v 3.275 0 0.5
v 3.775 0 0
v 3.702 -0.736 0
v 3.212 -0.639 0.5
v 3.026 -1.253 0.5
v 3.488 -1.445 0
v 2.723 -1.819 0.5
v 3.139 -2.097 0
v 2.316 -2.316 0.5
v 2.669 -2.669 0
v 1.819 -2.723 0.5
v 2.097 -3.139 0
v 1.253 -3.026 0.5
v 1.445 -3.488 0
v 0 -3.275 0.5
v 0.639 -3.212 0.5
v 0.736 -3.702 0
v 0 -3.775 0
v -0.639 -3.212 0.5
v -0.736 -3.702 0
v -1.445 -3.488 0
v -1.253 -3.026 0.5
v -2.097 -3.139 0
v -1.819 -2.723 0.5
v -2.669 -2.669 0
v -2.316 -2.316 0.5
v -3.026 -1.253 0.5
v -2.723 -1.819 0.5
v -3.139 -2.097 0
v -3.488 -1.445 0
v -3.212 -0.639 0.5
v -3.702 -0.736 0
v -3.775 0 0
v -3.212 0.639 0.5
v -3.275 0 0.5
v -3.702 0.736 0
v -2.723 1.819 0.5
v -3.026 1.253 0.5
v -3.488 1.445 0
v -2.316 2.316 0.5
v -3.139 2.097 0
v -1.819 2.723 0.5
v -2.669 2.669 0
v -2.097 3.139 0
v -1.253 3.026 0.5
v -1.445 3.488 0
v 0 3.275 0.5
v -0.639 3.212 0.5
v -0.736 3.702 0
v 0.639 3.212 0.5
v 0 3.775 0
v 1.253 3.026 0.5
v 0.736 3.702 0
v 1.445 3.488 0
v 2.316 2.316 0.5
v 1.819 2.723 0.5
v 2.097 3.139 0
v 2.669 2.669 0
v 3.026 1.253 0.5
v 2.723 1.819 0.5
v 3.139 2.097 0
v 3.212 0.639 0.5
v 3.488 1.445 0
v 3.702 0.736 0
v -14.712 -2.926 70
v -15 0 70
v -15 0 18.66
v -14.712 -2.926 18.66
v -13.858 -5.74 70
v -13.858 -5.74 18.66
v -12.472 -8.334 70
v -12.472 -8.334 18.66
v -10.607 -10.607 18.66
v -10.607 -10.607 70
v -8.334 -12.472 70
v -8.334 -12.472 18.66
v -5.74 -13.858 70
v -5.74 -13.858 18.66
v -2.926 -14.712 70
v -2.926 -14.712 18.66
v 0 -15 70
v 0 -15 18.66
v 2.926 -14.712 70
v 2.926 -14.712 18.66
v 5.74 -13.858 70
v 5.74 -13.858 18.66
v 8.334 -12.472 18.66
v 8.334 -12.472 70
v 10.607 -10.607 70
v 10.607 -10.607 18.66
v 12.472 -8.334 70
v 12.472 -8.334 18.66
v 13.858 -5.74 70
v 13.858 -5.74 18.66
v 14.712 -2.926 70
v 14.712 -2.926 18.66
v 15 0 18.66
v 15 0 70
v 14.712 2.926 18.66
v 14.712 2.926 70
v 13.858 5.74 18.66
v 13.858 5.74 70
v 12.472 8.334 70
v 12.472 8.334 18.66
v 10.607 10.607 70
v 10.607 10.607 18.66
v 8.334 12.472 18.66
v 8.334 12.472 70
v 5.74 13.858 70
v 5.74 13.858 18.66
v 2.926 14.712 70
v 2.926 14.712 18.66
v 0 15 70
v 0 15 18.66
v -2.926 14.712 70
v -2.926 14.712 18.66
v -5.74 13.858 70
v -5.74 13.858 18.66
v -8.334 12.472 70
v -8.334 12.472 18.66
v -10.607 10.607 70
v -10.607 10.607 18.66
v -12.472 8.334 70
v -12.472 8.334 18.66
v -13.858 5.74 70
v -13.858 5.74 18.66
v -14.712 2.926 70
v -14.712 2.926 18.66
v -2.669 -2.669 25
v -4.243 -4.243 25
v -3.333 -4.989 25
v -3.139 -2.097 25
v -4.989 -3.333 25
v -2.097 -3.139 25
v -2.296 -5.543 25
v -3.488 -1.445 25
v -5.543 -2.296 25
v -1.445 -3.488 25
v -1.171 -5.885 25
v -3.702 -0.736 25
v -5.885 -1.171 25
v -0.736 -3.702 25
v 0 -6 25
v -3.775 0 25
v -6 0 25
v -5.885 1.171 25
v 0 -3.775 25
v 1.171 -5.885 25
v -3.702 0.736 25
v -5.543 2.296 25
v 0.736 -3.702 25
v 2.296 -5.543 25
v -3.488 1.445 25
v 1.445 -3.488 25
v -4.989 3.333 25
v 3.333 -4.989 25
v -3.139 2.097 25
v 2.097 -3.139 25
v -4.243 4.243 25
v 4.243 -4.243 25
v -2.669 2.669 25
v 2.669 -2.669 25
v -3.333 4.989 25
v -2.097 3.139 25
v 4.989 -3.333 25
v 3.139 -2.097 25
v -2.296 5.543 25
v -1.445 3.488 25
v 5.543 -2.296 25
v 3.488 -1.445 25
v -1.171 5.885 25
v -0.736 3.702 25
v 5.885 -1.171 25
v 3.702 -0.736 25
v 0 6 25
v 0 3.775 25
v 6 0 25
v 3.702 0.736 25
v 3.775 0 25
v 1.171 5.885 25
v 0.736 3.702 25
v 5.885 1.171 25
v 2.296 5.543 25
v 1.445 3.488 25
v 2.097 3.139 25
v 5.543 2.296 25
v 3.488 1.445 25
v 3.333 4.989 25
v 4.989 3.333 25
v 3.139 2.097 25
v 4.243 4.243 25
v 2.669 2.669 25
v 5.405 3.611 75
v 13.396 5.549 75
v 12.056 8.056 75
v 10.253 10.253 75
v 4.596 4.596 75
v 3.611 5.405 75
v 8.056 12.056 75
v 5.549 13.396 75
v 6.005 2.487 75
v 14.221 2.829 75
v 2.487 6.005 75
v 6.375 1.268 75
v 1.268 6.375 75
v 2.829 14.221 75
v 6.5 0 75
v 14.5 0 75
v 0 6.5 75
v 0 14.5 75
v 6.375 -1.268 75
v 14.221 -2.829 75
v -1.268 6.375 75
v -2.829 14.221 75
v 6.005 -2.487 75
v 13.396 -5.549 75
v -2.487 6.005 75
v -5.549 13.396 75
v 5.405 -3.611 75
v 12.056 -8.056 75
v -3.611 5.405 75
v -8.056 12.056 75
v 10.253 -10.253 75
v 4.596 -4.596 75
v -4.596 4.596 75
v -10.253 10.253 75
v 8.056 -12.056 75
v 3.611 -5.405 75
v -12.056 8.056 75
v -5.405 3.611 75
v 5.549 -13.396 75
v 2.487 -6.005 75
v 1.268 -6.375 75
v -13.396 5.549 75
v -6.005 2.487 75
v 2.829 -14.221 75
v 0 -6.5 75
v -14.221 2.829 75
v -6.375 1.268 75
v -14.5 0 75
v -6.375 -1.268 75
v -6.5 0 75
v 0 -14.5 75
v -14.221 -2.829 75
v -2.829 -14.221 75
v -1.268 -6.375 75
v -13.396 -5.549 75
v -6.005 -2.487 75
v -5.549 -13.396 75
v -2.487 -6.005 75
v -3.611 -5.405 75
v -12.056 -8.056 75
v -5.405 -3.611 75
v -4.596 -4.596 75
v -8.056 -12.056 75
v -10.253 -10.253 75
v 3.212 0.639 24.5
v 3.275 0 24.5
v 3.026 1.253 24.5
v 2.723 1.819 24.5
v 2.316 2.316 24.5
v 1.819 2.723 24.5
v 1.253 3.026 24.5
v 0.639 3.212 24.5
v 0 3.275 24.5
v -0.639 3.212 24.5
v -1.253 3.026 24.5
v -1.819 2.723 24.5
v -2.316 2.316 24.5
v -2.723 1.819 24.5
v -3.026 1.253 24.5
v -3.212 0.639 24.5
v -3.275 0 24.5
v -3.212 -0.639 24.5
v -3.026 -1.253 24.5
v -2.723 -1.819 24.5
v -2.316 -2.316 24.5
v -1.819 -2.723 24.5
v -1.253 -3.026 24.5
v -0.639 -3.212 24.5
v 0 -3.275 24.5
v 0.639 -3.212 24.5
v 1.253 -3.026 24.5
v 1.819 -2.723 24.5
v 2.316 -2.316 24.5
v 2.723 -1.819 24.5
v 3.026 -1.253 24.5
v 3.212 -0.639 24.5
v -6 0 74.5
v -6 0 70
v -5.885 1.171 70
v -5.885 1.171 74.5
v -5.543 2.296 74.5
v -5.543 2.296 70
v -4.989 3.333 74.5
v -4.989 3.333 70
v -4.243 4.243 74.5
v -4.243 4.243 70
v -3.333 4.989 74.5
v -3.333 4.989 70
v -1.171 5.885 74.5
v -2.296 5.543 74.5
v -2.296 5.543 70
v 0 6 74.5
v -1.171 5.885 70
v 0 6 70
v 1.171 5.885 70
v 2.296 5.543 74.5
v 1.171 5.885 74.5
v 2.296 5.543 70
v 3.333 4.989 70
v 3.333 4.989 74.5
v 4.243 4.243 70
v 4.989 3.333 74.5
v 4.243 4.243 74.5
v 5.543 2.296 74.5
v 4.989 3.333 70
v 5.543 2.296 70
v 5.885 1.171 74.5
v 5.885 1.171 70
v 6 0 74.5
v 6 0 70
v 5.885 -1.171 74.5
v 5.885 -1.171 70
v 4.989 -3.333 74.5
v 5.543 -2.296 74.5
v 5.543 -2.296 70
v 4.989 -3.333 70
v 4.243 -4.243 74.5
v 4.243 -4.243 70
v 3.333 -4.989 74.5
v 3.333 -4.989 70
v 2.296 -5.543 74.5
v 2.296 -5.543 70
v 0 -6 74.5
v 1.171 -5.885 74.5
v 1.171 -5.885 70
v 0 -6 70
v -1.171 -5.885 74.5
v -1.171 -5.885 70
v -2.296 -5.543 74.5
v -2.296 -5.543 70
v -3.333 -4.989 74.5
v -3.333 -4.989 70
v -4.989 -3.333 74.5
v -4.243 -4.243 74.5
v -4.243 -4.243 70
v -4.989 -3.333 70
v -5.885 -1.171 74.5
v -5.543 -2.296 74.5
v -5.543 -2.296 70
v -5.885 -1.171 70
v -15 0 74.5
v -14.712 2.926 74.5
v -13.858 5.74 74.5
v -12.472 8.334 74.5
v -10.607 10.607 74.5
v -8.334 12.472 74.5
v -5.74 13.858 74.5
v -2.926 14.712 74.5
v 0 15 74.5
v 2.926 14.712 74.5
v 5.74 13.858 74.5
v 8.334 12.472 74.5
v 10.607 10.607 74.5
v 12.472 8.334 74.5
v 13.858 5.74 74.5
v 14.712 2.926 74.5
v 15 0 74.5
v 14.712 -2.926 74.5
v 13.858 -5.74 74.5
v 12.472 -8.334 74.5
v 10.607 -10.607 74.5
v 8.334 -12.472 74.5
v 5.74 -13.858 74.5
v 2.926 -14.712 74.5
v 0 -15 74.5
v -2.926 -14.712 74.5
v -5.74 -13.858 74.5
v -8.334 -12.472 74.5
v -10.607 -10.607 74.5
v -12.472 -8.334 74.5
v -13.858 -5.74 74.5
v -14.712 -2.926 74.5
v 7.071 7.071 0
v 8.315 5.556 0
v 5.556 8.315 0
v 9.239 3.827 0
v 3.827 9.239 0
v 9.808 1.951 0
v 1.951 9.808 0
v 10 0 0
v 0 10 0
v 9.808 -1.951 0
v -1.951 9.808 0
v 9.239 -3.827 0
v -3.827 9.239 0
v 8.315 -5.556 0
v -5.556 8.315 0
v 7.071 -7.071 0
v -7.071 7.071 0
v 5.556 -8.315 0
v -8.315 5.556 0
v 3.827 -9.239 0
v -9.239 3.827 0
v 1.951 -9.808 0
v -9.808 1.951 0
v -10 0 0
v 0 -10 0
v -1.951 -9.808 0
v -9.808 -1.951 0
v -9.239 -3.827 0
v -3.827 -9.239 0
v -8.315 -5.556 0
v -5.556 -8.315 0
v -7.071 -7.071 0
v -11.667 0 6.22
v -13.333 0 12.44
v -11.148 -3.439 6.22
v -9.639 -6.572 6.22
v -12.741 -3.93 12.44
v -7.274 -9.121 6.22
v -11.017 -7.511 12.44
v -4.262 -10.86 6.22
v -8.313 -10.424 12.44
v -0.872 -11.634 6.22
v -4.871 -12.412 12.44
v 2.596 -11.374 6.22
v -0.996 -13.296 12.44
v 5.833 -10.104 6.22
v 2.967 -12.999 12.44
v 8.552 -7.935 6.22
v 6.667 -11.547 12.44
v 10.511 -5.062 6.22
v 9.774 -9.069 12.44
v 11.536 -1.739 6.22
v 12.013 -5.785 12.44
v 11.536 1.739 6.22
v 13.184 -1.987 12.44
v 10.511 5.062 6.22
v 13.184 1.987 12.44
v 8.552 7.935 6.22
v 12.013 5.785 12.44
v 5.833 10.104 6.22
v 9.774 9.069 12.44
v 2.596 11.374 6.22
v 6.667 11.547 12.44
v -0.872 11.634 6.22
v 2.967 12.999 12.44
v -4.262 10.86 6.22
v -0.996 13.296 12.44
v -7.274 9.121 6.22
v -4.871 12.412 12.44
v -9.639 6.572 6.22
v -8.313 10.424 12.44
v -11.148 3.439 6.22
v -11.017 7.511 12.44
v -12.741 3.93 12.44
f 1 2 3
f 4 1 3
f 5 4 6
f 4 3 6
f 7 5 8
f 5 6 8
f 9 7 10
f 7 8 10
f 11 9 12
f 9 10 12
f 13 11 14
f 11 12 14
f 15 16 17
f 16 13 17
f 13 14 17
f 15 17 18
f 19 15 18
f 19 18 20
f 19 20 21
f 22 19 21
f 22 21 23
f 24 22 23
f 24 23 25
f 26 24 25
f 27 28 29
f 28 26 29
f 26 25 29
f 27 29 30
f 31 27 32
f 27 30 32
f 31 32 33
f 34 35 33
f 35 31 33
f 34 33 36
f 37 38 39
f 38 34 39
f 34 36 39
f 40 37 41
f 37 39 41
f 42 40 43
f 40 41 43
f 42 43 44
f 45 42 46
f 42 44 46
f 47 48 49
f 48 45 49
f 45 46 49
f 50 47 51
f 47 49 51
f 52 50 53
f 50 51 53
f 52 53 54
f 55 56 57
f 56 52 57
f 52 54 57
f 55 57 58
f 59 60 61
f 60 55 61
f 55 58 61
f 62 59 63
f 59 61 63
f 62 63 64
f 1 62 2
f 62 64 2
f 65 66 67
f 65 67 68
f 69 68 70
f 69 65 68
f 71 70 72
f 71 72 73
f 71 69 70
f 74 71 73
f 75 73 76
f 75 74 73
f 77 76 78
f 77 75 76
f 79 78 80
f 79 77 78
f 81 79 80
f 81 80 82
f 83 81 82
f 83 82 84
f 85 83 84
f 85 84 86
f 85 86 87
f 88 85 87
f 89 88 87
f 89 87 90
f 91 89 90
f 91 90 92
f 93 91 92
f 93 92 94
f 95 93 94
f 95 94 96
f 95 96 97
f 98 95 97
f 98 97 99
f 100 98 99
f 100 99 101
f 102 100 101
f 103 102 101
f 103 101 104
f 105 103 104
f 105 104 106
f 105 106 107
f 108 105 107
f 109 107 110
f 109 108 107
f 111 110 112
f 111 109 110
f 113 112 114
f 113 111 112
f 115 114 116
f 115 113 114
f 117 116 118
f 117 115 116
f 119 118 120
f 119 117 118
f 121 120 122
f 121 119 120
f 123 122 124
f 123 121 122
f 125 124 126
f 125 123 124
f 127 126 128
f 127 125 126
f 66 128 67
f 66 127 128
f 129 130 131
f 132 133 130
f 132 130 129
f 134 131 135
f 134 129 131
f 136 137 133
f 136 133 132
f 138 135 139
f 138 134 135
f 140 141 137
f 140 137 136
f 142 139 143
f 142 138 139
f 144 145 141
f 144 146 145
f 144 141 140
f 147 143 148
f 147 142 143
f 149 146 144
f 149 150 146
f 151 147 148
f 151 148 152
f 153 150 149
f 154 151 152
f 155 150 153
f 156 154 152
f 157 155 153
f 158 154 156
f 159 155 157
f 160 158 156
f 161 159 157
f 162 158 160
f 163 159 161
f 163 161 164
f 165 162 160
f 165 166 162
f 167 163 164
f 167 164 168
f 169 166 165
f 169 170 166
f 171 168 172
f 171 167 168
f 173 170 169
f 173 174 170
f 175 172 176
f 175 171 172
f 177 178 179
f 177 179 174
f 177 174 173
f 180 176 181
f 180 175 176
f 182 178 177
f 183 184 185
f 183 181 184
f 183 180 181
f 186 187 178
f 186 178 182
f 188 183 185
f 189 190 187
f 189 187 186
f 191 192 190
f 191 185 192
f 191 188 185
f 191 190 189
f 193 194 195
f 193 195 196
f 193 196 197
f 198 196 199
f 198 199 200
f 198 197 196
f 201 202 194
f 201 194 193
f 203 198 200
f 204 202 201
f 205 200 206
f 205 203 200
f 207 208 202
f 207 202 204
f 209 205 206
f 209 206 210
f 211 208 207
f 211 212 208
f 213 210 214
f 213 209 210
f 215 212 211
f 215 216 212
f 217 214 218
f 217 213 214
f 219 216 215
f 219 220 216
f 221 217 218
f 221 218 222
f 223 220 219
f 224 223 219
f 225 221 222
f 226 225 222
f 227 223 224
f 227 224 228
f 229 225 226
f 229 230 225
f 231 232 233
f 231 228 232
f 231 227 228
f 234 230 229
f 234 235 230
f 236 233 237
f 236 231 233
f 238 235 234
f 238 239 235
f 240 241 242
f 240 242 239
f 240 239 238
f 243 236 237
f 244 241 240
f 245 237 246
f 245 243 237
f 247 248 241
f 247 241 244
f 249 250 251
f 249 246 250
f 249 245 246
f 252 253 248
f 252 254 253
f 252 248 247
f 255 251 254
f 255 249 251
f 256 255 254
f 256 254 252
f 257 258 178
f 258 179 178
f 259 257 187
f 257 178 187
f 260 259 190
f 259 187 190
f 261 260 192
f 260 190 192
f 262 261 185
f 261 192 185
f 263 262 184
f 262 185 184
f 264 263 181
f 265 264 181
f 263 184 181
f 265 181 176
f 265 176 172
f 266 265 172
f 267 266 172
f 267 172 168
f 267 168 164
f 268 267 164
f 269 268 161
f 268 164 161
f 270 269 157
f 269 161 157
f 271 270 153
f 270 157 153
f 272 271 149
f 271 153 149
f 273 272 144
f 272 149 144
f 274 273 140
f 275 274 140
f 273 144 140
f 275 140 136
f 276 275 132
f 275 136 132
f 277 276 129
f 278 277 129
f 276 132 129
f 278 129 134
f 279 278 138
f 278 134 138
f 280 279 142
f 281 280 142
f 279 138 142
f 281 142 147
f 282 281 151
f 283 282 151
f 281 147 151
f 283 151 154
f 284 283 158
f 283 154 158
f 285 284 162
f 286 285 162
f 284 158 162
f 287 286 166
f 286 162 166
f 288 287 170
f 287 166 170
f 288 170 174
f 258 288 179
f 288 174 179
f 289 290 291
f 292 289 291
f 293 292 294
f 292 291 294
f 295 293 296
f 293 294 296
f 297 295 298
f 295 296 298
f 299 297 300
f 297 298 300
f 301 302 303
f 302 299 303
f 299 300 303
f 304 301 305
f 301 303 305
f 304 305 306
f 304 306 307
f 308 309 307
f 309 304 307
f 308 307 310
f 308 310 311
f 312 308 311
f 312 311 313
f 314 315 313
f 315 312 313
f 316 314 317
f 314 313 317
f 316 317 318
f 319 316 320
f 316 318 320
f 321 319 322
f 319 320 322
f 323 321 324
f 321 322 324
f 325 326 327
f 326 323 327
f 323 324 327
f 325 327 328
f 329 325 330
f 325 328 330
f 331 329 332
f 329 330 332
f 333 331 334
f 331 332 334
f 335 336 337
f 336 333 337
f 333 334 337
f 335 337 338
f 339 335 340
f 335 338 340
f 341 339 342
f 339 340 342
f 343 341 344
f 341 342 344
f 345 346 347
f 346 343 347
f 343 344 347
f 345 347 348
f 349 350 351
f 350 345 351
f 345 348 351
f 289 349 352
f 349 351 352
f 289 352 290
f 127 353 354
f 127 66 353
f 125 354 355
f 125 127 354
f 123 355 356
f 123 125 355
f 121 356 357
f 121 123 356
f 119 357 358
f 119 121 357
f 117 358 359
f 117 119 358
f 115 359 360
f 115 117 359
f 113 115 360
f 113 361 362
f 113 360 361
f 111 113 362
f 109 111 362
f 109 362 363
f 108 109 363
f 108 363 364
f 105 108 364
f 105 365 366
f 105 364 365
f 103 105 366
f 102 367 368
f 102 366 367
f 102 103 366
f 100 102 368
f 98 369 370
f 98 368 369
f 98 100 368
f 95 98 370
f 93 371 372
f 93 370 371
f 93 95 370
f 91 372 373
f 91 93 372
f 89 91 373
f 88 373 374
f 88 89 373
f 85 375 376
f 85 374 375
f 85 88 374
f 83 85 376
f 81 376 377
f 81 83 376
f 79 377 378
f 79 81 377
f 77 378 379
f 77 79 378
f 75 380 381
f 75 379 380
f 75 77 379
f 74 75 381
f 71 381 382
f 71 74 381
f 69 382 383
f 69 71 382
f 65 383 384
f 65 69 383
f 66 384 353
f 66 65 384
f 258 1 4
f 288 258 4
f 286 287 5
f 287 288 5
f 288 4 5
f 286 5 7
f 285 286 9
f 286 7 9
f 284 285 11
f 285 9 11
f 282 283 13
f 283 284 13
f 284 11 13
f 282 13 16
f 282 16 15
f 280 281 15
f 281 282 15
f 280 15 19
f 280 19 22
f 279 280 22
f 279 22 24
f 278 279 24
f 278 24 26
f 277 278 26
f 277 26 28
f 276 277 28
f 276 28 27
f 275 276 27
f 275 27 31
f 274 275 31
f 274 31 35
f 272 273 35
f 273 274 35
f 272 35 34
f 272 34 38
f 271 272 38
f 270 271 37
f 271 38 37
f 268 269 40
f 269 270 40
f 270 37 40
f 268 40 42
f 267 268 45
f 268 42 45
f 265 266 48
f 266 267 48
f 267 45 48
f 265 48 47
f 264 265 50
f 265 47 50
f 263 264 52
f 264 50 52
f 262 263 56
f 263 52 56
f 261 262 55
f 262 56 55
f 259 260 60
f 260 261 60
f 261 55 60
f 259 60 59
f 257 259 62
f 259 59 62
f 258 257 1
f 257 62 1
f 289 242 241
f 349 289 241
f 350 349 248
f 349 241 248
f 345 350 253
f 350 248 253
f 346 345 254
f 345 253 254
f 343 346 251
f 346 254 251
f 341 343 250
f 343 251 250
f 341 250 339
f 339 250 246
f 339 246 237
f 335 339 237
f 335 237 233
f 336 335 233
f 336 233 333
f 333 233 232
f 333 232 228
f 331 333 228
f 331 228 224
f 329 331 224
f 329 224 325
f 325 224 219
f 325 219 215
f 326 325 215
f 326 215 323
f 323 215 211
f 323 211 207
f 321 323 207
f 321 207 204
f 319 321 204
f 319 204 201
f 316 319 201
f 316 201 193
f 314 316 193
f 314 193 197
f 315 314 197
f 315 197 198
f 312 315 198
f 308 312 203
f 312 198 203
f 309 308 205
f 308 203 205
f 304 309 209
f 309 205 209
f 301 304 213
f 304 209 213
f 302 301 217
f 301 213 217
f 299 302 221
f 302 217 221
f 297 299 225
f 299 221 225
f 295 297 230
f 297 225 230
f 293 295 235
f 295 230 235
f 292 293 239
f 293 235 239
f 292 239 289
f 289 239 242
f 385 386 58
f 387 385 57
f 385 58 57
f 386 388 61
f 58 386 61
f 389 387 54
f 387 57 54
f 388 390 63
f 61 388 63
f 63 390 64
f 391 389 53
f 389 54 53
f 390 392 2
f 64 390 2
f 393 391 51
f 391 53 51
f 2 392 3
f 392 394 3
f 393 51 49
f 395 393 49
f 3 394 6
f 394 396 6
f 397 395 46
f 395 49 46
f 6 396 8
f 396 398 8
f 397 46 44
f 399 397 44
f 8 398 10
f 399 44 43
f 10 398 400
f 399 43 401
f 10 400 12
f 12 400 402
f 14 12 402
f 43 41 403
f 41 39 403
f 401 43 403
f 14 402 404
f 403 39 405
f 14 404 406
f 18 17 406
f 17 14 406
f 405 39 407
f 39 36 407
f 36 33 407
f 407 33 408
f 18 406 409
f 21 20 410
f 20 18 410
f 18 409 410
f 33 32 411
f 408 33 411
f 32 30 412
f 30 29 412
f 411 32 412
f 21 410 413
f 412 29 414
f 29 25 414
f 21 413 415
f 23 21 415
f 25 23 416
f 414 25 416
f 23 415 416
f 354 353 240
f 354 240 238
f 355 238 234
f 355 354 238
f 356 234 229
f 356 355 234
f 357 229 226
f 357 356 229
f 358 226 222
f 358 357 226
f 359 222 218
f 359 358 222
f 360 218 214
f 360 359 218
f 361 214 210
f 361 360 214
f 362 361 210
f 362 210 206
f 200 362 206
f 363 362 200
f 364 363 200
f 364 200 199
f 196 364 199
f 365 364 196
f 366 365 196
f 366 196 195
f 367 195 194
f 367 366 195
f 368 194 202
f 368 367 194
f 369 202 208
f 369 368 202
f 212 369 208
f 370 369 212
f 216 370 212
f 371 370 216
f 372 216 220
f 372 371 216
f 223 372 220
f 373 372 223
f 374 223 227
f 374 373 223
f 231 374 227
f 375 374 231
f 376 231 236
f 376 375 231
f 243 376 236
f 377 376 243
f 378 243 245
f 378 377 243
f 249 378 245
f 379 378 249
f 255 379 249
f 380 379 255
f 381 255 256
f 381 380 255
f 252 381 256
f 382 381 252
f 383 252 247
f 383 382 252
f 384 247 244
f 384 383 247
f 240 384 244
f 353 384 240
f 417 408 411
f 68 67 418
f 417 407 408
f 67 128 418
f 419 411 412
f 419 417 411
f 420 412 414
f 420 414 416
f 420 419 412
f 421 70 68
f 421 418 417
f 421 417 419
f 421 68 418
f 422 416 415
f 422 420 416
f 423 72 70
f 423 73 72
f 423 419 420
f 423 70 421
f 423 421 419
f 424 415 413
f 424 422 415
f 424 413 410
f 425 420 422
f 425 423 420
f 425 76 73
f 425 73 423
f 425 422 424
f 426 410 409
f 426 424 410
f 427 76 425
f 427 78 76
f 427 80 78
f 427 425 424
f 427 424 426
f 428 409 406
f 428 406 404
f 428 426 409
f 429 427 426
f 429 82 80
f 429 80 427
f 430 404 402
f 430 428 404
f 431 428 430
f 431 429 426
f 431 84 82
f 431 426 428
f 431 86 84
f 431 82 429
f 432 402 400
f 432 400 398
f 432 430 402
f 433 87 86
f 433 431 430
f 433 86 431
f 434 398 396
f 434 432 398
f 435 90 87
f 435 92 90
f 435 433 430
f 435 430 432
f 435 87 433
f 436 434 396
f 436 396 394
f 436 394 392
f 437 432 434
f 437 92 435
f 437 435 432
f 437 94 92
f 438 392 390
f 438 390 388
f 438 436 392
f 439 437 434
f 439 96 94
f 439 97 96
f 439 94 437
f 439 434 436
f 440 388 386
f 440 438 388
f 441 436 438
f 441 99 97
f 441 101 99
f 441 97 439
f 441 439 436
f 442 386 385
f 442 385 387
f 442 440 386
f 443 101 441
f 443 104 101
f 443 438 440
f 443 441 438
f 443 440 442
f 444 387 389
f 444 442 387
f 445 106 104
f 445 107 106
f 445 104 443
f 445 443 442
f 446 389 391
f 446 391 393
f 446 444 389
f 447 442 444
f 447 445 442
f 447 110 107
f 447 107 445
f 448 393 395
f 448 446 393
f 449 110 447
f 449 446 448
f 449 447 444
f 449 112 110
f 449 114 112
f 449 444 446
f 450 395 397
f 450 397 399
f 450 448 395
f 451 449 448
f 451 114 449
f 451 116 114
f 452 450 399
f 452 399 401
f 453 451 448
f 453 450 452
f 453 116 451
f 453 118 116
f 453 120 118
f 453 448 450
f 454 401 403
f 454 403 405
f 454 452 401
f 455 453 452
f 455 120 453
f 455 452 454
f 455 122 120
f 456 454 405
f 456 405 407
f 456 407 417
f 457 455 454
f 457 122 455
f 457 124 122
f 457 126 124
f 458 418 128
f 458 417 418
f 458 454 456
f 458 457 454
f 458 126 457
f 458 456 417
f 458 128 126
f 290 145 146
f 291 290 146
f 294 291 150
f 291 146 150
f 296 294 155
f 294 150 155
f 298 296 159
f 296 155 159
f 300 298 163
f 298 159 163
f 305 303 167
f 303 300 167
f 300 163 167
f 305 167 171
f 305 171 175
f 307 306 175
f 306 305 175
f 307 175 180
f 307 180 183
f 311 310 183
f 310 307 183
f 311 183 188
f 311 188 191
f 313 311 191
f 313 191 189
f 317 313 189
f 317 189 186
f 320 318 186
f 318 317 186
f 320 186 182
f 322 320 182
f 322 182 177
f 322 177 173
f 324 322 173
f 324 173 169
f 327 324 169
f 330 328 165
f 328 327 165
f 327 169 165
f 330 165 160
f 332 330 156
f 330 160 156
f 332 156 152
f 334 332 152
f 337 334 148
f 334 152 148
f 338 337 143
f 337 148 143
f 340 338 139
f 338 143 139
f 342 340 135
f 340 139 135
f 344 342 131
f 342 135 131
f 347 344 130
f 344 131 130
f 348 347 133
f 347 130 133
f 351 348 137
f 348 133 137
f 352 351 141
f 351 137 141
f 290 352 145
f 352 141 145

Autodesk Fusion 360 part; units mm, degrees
sketch "草图1" plane through (0, 0, 0) normal (0, 0, 1) x (1, 0, 0)
  circle A0 centre (0, 0) radius 10
  circle A1 centre (0, 0) radius 3.275
  dimension "d1" = 20
  dimension "d2" = 6.55
extrude "拉伸1" add sketch "草图1" along normal blind 20
sketch "草图2" plane through (0, 0, 20) normal (0, 0, 1) x (-1, 0, 0)
  circle A0 centre (0, 0) radius 3.275
  circle A1 centre (0, 0) radius 10
  circle A2 centre (0, 0) radius 6
  dimension "d5" = 12
extrude "拉伸2" add sketch "草图2" along normal blind 50 contours A1
extrude "Extrude3" add 1 faces at (-5.0571, 0.4608, 20) along direction (0, 0, 1) blind 5
sketch "Sketch3" plane through (0, 0, 70) normal (0, 0, 1) x (-1, 0, 0)
  circle A0 centre (0, 0) radius 6
  circle A1 centre (0, 0) radius 10
  circle A2 centre (0, 0) radius 15
  dimension "d11" = 30
extrude "Extrude4" add sketch "Sketch3" against normal blind 70 contours A2
chamfer "Chamfer2" distance 5 angle 75 1 edges at (13.9849, -5.4242, 0) measured on face at (-11.0236, 0.9079, 0)
extrude "Extrude5" add 1 faces at (-11.9442, 0.7452, 70) along direction (0, 0, 1) blind 5
chamfer "Chamfer3" distance 0.5 angle 45 2 edges at (-3.0534, 1.1843, 25) (-3.0534, 1.1843, 0) 1 faces at (-11.9442, 0.7452, 75) measured on face at (-5.0571, 0.4608, 25) measured on face at (3.2709, -0.1632, 16.6667)
chamfer "Chamfer1" [suppressed]
